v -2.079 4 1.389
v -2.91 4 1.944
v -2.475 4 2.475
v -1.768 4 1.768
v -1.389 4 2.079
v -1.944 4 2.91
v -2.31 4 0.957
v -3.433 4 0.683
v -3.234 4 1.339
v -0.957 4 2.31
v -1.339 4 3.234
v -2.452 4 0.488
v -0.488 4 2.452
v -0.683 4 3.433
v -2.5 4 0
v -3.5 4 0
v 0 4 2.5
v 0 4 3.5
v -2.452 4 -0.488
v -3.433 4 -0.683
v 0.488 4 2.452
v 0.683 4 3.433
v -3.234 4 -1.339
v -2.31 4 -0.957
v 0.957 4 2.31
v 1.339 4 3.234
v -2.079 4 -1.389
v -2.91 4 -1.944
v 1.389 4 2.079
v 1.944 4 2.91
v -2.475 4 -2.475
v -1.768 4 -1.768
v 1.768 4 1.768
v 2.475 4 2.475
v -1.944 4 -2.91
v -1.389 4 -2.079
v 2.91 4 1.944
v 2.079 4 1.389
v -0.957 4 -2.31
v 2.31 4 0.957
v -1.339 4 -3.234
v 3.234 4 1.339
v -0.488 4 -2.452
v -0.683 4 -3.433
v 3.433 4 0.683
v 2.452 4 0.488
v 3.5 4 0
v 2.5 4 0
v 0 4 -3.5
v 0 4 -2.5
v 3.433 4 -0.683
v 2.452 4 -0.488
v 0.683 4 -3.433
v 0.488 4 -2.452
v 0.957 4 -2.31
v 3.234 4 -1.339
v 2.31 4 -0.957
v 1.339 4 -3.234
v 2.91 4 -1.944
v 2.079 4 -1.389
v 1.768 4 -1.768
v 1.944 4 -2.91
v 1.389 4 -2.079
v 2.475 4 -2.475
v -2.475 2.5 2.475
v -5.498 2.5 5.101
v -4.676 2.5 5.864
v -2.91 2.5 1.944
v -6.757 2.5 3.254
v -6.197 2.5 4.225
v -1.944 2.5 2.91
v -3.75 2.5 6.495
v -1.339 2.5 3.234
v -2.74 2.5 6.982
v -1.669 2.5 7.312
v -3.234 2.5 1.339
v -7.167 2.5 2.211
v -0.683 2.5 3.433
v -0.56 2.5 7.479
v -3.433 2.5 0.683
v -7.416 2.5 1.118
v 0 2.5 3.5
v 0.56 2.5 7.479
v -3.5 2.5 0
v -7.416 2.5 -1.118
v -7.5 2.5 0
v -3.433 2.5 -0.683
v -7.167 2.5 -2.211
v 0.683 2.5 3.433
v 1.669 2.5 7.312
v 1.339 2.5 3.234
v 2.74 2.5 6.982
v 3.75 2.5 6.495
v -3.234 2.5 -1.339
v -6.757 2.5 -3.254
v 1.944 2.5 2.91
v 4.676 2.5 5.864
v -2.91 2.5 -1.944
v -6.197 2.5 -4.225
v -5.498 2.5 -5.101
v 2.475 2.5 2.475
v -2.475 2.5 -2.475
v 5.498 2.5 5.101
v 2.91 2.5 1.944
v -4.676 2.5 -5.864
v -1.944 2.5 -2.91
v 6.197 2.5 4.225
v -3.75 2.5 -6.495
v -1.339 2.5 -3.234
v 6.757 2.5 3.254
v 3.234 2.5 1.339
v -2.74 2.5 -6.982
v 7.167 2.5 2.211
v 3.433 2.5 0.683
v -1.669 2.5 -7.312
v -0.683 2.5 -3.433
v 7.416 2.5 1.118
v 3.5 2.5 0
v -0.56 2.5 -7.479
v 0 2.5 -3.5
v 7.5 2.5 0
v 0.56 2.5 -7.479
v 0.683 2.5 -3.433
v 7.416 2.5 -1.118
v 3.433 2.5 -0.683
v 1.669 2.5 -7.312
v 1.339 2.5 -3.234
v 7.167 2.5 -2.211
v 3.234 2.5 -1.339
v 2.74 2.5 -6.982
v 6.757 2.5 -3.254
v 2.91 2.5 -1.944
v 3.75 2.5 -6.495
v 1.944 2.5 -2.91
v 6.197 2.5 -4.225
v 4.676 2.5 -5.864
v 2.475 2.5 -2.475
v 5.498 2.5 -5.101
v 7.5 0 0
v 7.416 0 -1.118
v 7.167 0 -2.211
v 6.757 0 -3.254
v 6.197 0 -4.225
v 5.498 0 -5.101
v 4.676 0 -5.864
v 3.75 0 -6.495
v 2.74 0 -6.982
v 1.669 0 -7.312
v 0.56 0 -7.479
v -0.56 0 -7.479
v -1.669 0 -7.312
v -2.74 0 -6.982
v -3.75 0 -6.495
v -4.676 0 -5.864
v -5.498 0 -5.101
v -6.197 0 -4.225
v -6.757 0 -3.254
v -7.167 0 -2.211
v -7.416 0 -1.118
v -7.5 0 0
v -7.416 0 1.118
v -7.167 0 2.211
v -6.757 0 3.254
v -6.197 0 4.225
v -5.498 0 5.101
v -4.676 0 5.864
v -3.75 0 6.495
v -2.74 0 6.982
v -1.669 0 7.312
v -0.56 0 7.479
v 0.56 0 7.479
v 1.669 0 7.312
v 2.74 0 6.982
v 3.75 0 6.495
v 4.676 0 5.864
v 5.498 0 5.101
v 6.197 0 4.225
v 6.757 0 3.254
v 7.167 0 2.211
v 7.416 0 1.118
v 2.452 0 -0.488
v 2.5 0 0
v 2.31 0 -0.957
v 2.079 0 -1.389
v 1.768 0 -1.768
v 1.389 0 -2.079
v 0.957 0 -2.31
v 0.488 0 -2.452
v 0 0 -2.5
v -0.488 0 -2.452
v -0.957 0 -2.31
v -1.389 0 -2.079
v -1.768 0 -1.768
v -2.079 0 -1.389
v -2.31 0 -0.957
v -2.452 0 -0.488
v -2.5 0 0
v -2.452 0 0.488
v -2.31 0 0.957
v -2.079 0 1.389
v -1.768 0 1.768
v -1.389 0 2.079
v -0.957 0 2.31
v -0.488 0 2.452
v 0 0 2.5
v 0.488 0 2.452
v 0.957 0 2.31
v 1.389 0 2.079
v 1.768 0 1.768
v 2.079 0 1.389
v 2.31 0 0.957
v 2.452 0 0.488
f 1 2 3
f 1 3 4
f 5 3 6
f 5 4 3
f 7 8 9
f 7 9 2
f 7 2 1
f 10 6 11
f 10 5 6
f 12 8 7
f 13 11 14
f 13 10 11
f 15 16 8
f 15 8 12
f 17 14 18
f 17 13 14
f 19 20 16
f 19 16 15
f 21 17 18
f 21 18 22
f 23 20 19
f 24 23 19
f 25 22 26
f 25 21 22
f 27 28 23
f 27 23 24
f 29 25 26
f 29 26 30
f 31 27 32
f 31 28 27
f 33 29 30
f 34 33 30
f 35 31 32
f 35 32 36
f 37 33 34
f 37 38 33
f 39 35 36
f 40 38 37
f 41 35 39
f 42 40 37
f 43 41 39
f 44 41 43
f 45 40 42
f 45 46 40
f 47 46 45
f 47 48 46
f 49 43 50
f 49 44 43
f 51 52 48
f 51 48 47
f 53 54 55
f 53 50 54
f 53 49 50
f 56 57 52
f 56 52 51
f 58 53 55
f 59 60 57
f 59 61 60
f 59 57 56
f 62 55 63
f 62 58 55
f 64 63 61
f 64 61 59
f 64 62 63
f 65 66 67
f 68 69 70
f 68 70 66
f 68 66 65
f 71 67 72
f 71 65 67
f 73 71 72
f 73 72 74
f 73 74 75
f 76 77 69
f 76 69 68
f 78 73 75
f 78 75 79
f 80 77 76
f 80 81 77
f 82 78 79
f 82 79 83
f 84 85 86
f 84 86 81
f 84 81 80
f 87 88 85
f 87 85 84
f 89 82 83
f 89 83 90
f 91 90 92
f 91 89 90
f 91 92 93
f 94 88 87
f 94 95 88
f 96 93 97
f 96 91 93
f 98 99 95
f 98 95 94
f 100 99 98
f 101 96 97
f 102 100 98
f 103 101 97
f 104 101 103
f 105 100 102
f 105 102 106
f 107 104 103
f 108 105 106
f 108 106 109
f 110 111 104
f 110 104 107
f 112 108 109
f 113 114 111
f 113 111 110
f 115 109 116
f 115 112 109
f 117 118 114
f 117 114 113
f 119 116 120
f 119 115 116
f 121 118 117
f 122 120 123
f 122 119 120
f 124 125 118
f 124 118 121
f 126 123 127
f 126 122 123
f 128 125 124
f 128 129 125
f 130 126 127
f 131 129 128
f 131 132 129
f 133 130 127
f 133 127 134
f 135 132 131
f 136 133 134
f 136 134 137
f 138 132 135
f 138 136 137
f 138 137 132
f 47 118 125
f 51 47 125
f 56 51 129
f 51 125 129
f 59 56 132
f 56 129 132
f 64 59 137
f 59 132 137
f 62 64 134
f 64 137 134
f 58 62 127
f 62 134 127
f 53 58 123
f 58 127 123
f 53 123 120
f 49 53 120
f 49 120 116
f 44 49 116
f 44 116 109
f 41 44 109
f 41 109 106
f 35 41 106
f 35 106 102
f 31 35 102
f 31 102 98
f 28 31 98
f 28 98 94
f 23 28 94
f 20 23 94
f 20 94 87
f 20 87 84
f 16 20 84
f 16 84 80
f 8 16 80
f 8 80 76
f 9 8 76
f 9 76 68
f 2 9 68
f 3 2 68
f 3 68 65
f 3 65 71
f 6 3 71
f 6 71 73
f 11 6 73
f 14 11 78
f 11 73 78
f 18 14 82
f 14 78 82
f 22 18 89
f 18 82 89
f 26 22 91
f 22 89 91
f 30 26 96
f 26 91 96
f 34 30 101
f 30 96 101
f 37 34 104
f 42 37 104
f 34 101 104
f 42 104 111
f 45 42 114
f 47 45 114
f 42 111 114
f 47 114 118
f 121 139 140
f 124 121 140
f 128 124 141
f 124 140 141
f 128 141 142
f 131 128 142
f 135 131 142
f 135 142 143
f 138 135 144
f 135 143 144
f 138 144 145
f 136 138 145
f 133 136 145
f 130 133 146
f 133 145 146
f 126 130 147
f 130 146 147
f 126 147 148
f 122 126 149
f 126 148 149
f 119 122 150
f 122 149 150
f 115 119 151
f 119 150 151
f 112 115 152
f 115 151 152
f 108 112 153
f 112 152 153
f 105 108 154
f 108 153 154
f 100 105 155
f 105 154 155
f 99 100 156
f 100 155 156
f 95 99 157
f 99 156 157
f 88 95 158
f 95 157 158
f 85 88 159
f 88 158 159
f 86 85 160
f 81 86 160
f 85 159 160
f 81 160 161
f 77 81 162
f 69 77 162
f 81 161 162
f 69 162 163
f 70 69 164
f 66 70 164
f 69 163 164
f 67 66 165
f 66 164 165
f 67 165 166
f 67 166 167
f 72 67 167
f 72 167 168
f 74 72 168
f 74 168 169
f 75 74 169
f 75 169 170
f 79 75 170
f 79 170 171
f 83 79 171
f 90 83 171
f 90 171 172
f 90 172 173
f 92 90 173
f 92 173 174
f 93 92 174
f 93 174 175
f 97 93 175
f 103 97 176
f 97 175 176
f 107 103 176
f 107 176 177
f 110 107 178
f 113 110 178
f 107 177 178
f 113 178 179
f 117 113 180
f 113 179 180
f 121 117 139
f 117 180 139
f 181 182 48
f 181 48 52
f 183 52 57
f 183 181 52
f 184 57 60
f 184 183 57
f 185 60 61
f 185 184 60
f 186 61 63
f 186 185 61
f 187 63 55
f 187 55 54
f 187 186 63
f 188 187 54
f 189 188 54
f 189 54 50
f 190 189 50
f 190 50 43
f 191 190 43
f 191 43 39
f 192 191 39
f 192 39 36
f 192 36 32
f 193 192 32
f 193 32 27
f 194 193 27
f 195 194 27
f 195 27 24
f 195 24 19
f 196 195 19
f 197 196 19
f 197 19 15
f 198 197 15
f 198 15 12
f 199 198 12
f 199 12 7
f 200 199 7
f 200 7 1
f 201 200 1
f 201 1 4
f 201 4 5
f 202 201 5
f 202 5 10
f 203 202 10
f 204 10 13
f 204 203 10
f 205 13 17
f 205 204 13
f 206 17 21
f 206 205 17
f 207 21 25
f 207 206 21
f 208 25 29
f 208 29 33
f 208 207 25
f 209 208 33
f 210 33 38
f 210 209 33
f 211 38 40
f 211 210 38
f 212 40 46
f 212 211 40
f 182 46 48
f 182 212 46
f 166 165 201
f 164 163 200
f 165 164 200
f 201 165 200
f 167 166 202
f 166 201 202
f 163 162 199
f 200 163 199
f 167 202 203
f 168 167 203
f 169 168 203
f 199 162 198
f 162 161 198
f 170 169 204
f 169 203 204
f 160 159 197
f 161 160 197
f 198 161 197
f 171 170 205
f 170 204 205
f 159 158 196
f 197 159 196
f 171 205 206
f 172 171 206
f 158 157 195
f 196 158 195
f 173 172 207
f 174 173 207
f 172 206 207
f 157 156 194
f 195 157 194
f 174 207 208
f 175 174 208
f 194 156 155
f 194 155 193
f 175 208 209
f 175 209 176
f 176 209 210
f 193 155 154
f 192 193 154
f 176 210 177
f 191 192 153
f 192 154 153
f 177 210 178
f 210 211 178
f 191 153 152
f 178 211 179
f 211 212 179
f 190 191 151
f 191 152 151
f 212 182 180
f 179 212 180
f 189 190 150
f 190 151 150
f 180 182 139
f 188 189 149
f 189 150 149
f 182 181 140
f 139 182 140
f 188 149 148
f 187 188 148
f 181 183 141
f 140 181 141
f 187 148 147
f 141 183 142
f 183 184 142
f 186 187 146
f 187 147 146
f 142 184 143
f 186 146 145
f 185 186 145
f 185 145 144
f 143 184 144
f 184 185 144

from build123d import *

# Parameters (mm, degrees)
SKETCH1_R           = 7.5
BOSS_EXTRUDE2_DEPTH = 2.5
SKETCH1_6_R         = 2.5
CUT_EXTRUDE1_DEPTH  = 3.5
SKETCH1_7_R         = 3.5
SKETCH1_7_R_2       = 2.5
BOSS_EXTRUDE3_DEPTH = 4


with BuildPart() as part:
    # Sketch1 → Boss-Extrude2 (new body)
    with BuildSketch(Plane(origin=(0, 0, 0), x_dir=(1, 0, 0), z_dir=(0, 1, 0))):
        Circle(SKETCH1_R)
    extrude(amount=BOSS_EXTRUDE2_DEPTH)

    # Sketch1<6> → Cut-Extrude1 (cut)
    with BuildSketch(Plane(origin=(0, 0, 0), x_dir=(1, 0, 0), z_dir=(0, 1, 0))):
        Circle(SKETCH1_6_R)
    extrude(amount=CUT_EXTRUDE1_DEPTH, mode=Mode.SUBTRACT)

    # Sketch1<7> → Boss-Extrude3 (add)
    with BuildSketch(Plane(origin=(0, 0, 0), x_dir=(1, 0, 0), z_dir=(0, 1, 0))):
        Circle(SKETCH1_7_R)
        Circle(SKETCH1_7_R_2, mode=Mode.SUBTRACT)
    extrude(amount=BOSS_EXTRUDE3_DEPTH)


solid = part.part
